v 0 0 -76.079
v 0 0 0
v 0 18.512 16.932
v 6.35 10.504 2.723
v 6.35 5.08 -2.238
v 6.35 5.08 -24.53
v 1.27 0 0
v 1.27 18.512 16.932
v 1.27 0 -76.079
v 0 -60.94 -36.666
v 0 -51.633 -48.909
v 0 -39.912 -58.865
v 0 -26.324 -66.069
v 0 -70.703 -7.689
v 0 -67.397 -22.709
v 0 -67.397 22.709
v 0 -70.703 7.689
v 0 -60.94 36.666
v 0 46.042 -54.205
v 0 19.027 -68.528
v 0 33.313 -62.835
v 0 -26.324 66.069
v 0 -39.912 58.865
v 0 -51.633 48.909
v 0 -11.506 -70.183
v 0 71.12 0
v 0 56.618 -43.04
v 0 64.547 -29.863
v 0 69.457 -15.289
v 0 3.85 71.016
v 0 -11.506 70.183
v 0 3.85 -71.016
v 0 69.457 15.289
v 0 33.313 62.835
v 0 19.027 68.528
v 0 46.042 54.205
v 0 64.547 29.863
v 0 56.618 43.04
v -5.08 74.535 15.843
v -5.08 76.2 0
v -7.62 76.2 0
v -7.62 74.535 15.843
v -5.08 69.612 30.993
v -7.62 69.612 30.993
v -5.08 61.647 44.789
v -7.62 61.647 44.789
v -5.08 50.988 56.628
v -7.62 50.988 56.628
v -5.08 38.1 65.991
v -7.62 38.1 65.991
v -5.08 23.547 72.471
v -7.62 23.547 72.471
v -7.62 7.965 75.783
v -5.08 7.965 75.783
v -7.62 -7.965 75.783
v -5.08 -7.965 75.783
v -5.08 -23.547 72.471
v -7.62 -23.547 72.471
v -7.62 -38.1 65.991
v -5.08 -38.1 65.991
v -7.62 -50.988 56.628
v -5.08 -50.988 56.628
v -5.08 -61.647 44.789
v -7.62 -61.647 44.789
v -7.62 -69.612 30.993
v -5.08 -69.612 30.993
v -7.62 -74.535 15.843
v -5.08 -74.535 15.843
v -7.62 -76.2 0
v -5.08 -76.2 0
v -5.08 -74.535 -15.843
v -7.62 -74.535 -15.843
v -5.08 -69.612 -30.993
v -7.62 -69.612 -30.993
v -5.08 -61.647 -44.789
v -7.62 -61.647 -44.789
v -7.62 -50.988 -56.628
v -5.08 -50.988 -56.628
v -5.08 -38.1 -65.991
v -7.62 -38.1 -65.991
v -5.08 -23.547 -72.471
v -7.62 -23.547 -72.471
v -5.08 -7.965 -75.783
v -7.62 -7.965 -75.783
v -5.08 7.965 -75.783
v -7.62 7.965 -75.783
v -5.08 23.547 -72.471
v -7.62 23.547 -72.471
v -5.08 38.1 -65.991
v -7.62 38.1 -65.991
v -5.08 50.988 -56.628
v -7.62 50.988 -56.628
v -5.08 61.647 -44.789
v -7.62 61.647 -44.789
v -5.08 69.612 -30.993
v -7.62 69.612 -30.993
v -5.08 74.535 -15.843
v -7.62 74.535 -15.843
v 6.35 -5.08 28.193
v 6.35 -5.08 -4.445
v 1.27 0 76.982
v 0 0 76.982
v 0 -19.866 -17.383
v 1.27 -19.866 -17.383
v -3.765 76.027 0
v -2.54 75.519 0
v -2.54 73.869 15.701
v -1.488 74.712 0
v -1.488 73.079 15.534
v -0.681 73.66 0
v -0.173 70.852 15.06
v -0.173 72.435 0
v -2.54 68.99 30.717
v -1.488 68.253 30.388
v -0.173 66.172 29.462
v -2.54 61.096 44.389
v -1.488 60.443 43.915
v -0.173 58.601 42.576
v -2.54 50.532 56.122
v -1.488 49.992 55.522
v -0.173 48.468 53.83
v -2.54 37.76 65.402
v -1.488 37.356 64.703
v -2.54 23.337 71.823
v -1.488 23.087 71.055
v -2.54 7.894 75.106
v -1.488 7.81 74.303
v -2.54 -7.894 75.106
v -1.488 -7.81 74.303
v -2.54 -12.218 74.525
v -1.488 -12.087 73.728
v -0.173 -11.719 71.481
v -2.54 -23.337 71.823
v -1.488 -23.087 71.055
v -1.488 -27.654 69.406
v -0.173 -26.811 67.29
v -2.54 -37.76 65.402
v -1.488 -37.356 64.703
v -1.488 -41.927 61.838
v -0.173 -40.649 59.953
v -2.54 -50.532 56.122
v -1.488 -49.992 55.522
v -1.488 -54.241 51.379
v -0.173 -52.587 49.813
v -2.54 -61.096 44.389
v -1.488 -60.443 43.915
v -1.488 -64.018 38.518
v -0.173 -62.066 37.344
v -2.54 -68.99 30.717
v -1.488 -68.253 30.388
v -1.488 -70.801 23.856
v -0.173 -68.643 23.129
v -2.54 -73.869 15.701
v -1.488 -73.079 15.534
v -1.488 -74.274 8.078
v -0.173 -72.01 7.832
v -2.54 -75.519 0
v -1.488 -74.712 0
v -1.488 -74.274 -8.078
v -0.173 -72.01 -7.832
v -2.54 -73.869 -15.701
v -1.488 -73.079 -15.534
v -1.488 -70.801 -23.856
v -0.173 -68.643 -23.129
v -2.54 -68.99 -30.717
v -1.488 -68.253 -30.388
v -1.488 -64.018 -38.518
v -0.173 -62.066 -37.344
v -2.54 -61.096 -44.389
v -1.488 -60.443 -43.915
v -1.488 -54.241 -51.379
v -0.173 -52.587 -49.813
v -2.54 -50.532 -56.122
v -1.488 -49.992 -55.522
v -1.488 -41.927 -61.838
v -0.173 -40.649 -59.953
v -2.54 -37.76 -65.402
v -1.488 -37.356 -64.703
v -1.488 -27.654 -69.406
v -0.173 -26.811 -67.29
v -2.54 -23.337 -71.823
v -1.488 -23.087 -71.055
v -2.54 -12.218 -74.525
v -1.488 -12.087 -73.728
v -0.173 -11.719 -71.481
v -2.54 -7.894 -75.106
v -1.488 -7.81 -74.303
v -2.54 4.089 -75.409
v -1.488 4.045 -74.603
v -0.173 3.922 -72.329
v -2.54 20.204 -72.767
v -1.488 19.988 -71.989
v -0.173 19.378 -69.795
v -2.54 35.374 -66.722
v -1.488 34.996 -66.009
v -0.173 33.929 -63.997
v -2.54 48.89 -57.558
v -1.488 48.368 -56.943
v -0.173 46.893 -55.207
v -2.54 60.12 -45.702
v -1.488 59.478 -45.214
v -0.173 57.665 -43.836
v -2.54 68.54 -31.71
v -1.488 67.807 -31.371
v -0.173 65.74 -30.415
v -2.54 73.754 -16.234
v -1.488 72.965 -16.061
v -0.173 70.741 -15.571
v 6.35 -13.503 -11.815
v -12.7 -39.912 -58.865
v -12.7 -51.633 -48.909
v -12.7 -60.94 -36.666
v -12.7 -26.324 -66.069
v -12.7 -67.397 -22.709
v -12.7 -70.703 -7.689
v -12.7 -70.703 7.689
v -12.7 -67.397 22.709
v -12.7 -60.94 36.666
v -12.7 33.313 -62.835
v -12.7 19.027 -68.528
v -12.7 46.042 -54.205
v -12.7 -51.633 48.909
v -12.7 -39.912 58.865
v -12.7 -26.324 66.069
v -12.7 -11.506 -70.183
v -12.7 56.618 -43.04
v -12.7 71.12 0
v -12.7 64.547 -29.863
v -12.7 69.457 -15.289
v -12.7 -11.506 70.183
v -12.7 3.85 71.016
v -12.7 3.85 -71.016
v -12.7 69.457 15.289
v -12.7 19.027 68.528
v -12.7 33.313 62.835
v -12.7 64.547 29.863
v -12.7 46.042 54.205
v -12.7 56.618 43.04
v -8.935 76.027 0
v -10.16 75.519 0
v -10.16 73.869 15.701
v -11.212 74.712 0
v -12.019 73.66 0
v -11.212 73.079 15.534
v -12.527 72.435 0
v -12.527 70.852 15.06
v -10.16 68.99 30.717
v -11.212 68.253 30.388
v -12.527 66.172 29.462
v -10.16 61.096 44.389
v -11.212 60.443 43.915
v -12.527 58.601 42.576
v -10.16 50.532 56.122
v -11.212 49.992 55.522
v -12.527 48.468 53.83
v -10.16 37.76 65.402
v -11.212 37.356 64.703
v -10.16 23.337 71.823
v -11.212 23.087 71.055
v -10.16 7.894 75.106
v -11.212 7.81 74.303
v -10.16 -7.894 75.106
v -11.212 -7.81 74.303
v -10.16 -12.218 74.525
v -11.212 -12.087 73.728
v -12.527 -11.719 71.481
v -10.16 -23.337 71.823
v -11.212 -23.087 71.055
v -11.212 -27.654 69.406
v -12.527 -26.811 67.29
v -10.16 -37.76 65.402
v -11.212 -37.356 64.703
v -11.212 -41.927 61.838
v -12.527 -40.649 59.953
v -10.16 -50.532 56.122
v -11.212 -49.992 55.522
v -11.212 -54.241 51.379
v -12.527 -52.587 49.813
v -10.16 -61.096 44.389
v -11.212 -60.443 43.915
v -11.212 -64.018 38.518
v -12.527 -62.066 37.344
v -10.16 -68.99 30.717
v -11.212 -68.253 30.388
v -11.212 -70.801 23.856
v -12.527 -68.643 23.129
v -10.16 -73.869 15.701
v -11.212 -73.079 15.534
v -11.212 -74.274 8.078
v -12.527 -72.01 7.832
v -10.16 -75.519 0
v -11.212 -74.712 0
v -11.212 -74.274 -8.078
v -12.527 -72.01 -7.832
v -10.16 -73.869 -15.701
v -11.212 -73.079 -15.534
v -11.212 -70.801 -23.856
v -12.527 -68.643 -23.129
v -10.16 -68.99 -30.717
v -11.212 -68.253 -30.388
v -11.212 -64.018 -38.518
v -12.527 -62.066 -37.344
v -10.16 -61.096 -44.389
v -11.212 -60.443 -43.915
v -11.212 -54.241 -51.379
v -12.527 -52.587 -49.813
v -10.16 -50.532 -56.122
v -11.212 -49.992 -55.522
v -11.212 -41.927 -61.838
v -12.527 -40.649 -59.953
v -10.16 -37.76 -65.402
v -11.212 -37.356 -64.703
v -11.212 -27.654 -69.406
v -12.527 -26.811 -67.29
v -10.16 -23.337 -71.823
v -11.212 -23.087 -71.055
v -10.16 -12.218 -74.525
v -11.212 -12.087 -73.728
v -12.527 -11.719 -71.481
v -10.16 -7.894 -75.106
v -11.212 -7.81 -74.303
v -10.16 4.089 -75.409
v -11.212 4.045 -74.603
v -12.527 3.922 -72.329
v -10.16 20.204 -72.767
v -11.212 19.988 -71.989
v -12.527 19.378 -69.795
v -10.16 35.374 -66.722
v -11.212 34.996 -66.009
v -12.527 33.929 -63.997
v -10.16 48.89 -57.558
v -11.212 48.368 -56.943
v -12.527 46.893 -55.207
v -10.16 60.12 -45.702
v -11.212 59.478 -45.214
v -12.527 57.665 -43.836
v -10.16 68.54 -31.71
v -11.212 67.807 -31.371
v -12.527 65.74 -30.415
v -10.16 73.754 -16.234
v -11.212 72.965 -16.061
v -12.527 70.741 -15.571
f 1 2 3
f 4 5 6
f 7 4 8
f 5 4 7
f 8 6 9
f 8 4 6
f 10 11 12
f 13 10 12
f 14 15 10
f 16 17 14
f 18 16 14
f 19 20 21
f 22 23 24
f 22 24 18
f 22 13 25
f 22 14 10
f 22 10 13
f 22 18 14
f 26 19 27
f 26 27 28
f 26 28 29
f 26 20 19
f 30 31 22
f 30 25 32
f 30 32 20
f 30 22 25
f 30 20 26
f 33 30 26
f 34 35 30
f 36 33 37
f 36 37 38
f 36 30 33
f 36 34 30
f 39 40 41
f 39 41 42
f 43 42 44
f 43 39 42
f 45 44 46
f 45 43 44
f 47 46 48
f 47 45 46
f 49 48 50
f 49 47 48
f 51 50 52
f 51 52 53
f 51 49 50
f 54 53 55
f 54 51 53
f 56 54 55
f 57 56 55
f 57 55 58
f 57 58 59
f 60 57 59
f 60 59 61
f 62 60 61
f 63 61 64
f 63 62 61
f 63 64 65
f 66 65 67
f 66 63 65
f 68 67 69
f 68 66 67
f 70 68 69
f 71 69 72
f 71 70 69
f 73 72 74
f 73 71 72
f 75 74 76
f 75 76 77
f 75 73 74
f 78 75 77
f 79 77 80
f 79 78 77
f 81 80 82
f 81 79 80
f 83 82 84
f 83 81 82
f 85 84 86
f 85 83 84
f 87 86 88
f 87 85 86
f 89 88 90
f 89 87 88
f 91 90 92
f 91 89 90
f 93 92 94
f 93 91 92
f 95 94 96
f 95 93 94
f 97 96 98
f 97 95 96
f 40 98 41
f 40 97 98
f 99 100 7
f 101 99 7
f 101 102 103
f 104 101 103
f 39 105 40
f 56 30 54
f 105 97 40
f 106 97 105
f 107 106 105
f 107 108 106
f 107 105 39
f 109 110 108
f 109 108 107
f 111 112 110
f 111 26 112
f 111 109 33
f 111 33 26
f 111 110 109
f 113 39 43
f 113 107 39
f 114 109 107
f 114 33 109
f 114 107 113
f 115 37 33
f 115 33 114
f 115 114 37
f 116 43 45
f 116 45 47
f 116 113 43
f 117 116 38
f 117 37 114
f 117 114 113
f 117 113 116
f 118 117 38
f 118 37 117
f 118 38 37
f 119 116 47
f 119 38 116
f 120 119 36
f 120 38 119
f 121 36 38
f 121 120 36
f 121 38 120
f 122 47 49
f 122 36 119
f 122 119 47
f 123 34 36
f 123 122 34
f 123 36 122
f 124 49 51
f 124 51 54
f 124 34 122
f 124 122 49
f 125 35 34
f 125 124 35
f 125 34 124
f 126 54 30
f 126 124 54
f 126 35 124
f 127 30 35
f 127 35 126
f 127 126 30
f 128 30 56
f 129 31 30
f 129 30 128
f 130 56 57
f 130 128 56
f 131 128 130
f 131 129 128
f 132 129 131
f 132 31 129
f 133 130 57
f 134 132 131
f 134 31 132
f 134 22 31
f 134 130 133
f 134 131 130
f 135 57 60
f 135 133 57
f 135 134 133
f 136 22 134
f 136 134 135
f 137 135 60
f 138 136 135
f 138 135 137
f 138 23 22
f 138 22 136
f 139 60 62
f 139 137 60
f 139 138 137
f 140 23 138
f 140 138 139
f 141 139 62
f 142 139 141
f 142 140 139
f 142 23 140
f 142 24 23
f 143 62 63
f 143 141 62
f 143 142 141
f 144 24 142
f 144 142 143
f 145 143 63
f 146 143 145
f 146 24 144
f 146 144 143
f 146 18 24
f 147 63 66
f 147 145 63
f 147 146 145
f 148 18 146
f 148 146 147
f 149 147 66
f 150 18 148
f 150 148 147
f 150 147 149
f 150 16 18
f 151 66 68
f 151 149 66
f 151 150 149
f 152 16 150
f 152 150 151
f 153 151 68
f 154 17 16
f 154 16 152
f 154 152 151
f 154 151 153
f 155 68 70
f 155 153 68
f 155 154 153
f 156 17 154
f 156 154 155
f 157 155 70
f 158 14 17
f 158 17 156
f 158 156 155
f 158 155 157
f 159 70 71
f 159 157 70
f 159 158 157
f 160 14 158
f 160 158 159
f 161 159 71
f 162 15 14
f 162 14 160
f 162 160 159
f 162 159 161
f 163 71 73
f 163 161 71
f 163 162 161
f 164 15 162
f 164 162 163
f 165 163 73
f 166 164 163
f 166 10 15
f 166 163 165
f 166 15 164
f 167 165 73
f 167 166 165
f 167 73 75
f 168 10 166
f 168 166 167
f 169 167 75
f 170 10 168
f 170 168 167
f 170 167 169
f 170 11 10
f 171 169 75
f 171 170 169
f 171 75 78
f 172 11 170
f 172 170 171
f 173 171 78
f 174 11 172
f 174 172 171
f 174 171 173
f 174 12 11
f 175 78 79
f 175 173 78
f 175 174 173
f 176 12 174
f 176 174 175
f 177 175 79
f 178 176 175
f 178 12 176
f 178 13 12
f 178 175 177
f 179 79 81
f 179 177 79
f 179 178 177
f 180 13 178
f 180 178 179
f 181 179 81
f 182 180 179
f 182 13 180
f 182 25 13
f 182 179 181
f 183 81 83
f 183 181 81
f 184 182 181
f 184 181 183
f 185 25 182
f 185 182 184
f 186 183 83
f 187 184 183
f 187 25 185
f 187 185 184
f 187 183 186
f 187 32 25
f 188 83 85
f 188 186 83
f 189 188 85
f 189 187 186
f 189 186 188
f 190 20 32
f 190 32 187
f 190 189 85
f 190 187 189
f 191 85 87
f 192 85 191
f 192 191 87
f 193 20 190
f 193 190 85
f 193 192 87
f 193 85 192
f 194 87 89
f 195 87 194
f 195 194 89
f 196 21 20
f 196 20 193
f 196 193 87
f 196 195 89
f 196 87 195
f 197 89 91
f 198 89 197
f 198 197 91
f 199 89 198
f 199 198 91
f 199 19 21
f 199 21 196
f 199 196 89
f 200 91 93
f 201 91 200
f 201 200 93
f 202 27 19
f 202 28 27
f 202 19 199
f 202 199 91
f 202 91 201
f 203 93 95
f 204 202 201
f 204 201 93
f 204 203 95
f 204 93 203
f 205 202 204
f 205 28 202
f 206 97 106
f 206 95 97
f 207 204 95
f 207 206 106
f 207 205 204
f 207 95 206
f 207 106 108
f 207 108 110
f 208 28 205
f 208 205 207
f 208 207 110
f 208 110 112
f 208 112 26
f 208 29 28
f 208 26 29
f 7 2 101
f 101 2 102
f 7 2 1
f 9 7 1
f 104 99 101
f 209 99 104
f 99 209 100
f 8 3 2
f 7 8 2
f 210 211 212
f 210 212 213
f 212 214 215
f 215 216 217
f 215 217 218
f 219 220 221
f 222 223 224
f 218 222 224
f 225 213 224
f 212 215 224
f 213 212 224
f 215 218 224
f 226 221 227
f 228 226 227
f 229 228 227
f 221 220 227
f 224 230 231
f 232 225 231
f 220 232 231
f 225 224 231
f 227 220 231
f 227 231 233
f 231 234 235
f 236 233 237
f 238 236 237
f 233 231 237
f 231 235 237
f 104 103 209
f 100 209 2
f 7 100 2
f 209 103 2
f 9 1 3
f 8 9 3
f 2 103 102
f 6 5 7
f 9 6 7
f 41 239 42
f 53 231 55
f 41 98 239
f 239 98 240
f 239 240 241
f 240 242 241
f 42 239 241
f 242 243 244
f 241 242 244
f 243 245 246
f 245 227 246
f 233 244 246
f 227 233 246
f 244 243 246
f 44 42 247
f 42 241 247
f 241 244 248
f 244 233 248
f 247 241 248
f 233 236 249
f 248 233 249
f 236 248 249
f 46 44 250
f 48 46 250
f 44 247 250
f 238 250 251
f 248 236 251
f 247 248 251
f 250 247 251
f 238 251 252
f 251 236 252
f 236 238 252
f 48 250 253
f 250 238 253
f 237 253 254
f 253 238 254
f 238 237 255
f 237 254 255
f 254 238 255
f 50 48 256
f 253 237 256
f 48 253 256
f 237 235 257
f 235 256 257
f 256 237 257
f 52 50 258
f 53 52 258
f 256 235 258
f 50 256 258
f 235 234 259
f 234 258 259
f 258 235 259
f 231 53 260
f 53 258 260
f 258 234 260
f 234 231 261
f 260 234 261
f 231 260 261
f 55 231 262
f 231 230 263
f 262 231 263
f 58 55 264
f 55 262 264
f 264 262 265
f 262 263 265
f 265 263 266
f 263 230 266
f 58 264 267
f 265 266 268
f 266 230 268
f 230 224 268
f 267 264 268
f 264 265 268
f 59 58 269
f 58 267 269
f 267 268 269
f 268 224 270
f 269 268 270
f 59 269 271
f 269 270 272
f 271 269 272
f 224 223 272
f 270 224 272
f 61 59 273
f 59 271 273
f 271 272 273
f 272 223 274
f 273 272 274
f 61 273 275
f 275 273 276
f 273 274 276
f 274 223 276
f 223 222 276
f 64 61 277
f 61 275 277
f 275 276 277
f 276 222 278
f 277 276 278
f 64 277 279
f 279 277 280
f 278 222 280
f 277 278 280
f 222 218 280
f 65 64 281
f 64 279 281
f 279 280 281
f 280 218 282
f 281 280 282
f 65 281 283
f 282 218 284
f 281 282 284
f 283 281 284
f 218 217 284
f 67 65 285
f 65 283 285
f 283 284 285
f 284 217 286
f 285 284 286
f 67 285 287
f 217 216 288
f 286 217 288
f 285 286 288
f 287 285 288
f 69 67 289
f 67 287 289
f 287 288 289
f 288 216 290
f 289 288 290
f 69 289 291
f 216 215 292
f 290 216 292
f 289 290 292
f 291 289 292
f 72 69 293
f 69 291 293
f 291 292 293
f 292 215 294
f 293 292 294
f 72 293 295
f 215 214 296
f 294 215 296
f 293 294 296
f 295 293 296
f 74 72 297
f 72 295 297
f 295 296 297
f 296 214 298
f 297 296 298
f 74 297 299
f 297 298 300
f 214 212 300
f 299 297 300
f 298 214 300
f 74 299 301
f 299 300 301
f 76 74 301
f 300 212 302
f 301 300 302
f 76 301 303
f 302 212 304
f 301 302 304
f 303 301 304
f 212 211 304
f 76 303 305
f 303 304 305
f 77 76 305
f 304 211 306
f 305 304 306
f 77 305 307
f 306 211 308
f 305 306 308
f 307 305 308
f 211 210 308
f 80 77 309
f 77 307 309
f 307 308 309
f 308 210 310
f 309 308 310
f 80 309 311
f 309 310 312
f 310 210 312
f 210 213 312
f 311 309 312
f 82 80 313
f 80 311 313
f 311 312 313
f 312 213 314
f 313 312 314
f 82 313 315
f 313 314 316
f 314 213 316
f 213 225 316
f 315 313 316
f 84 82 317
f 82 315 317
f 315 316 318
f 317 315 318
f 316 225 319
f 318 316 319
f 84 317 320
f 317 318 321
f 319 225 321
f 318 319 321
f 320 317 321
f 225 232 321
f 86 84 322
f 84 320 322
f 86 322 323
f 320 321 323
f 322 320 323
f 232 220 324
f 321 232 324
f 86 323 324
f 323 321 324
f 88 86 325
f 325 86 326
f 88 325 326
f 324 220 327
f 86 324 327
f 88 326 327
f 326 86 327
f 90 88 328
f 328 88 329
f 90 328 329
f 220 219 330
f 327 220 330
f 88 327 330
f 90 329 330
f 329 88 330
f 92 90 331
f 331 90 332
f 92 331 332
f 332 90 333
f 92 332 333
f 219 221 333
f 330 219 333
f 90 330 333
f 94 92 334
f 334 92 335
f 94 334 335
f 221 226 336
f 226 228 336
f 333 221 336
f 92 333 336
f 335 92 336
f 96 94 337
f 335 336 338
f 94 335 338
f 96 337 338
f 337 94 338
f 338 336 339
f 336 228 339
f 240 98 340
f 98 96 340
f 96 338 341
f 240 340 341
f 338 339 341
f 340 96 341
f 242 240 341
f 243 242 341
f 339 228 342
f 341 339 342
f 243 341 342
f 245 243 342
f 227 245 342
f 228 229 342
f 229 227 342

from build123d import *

# Parameters (mm, degrees)
F1_DEPTH  = 6.35
F2_R      = 76.2
F3_DEPTH  = 12.7
F4_R      = 5.08
F5_SIZE   = 5.08
F5_2_SIZE = 5.08


with BuildPart() as f1:
    # F0 (on Right) → F1 (new body)
    with BuildSketch(Plane.YZ):
        Polygon((18.5117721558, 16.9315002859), (0, 0), (0, -76.0788396001), align=None)
    extrude(amount=F1_DEPTH)

    # F5#2
    f5_2_edges = [f1.edges().sort_by_distance(p)[0] for p in [
        (6.35, 0, -38.03942),
        (6.35, 9.255886, -29.57367),
        (6.35, 9.255886, 8.46575),
    ]]
    chamfer(f5_2_edges, length=F5_2_SIZE)


with BuildPart() as f1b:
    # F0 (on Right) → F1, piece 2 (new body)
    with BuildSketch(Plane.YZ):
        Polygon((0, 0), (0, 76.9818648696), (-19.8662821203, -17.3829961568), align=None)
    extrude(amount=F1_DEPTH)

    # F5
    f5_edges = [f1b.edges().sort_by_distance(p)[0] for p in [
        (6.35, -9.933141, 29.799434),
        (6.35, 0, 38.490932),
    ]]
    chamfer(f5_edges, length=F5_SIZE)


with BuildPart() as f3:
    # F2 (on Right) → F3 (new body)
    with BuildSketch(Plane.YZ):
        Circle(F2_R)
    extrude(amount=-F3_DEPTH)

    # F4
    f4_edges = [f3.edges().sort_by_distance(p)[0] for p in [
        (0, -76.2, 0),
        (-12.7, -76.2, 0),
    ]]
    fillet(f4_edges, radius=F4_R)


solid = Compound([f1.part, f1b.part, f3.part])
